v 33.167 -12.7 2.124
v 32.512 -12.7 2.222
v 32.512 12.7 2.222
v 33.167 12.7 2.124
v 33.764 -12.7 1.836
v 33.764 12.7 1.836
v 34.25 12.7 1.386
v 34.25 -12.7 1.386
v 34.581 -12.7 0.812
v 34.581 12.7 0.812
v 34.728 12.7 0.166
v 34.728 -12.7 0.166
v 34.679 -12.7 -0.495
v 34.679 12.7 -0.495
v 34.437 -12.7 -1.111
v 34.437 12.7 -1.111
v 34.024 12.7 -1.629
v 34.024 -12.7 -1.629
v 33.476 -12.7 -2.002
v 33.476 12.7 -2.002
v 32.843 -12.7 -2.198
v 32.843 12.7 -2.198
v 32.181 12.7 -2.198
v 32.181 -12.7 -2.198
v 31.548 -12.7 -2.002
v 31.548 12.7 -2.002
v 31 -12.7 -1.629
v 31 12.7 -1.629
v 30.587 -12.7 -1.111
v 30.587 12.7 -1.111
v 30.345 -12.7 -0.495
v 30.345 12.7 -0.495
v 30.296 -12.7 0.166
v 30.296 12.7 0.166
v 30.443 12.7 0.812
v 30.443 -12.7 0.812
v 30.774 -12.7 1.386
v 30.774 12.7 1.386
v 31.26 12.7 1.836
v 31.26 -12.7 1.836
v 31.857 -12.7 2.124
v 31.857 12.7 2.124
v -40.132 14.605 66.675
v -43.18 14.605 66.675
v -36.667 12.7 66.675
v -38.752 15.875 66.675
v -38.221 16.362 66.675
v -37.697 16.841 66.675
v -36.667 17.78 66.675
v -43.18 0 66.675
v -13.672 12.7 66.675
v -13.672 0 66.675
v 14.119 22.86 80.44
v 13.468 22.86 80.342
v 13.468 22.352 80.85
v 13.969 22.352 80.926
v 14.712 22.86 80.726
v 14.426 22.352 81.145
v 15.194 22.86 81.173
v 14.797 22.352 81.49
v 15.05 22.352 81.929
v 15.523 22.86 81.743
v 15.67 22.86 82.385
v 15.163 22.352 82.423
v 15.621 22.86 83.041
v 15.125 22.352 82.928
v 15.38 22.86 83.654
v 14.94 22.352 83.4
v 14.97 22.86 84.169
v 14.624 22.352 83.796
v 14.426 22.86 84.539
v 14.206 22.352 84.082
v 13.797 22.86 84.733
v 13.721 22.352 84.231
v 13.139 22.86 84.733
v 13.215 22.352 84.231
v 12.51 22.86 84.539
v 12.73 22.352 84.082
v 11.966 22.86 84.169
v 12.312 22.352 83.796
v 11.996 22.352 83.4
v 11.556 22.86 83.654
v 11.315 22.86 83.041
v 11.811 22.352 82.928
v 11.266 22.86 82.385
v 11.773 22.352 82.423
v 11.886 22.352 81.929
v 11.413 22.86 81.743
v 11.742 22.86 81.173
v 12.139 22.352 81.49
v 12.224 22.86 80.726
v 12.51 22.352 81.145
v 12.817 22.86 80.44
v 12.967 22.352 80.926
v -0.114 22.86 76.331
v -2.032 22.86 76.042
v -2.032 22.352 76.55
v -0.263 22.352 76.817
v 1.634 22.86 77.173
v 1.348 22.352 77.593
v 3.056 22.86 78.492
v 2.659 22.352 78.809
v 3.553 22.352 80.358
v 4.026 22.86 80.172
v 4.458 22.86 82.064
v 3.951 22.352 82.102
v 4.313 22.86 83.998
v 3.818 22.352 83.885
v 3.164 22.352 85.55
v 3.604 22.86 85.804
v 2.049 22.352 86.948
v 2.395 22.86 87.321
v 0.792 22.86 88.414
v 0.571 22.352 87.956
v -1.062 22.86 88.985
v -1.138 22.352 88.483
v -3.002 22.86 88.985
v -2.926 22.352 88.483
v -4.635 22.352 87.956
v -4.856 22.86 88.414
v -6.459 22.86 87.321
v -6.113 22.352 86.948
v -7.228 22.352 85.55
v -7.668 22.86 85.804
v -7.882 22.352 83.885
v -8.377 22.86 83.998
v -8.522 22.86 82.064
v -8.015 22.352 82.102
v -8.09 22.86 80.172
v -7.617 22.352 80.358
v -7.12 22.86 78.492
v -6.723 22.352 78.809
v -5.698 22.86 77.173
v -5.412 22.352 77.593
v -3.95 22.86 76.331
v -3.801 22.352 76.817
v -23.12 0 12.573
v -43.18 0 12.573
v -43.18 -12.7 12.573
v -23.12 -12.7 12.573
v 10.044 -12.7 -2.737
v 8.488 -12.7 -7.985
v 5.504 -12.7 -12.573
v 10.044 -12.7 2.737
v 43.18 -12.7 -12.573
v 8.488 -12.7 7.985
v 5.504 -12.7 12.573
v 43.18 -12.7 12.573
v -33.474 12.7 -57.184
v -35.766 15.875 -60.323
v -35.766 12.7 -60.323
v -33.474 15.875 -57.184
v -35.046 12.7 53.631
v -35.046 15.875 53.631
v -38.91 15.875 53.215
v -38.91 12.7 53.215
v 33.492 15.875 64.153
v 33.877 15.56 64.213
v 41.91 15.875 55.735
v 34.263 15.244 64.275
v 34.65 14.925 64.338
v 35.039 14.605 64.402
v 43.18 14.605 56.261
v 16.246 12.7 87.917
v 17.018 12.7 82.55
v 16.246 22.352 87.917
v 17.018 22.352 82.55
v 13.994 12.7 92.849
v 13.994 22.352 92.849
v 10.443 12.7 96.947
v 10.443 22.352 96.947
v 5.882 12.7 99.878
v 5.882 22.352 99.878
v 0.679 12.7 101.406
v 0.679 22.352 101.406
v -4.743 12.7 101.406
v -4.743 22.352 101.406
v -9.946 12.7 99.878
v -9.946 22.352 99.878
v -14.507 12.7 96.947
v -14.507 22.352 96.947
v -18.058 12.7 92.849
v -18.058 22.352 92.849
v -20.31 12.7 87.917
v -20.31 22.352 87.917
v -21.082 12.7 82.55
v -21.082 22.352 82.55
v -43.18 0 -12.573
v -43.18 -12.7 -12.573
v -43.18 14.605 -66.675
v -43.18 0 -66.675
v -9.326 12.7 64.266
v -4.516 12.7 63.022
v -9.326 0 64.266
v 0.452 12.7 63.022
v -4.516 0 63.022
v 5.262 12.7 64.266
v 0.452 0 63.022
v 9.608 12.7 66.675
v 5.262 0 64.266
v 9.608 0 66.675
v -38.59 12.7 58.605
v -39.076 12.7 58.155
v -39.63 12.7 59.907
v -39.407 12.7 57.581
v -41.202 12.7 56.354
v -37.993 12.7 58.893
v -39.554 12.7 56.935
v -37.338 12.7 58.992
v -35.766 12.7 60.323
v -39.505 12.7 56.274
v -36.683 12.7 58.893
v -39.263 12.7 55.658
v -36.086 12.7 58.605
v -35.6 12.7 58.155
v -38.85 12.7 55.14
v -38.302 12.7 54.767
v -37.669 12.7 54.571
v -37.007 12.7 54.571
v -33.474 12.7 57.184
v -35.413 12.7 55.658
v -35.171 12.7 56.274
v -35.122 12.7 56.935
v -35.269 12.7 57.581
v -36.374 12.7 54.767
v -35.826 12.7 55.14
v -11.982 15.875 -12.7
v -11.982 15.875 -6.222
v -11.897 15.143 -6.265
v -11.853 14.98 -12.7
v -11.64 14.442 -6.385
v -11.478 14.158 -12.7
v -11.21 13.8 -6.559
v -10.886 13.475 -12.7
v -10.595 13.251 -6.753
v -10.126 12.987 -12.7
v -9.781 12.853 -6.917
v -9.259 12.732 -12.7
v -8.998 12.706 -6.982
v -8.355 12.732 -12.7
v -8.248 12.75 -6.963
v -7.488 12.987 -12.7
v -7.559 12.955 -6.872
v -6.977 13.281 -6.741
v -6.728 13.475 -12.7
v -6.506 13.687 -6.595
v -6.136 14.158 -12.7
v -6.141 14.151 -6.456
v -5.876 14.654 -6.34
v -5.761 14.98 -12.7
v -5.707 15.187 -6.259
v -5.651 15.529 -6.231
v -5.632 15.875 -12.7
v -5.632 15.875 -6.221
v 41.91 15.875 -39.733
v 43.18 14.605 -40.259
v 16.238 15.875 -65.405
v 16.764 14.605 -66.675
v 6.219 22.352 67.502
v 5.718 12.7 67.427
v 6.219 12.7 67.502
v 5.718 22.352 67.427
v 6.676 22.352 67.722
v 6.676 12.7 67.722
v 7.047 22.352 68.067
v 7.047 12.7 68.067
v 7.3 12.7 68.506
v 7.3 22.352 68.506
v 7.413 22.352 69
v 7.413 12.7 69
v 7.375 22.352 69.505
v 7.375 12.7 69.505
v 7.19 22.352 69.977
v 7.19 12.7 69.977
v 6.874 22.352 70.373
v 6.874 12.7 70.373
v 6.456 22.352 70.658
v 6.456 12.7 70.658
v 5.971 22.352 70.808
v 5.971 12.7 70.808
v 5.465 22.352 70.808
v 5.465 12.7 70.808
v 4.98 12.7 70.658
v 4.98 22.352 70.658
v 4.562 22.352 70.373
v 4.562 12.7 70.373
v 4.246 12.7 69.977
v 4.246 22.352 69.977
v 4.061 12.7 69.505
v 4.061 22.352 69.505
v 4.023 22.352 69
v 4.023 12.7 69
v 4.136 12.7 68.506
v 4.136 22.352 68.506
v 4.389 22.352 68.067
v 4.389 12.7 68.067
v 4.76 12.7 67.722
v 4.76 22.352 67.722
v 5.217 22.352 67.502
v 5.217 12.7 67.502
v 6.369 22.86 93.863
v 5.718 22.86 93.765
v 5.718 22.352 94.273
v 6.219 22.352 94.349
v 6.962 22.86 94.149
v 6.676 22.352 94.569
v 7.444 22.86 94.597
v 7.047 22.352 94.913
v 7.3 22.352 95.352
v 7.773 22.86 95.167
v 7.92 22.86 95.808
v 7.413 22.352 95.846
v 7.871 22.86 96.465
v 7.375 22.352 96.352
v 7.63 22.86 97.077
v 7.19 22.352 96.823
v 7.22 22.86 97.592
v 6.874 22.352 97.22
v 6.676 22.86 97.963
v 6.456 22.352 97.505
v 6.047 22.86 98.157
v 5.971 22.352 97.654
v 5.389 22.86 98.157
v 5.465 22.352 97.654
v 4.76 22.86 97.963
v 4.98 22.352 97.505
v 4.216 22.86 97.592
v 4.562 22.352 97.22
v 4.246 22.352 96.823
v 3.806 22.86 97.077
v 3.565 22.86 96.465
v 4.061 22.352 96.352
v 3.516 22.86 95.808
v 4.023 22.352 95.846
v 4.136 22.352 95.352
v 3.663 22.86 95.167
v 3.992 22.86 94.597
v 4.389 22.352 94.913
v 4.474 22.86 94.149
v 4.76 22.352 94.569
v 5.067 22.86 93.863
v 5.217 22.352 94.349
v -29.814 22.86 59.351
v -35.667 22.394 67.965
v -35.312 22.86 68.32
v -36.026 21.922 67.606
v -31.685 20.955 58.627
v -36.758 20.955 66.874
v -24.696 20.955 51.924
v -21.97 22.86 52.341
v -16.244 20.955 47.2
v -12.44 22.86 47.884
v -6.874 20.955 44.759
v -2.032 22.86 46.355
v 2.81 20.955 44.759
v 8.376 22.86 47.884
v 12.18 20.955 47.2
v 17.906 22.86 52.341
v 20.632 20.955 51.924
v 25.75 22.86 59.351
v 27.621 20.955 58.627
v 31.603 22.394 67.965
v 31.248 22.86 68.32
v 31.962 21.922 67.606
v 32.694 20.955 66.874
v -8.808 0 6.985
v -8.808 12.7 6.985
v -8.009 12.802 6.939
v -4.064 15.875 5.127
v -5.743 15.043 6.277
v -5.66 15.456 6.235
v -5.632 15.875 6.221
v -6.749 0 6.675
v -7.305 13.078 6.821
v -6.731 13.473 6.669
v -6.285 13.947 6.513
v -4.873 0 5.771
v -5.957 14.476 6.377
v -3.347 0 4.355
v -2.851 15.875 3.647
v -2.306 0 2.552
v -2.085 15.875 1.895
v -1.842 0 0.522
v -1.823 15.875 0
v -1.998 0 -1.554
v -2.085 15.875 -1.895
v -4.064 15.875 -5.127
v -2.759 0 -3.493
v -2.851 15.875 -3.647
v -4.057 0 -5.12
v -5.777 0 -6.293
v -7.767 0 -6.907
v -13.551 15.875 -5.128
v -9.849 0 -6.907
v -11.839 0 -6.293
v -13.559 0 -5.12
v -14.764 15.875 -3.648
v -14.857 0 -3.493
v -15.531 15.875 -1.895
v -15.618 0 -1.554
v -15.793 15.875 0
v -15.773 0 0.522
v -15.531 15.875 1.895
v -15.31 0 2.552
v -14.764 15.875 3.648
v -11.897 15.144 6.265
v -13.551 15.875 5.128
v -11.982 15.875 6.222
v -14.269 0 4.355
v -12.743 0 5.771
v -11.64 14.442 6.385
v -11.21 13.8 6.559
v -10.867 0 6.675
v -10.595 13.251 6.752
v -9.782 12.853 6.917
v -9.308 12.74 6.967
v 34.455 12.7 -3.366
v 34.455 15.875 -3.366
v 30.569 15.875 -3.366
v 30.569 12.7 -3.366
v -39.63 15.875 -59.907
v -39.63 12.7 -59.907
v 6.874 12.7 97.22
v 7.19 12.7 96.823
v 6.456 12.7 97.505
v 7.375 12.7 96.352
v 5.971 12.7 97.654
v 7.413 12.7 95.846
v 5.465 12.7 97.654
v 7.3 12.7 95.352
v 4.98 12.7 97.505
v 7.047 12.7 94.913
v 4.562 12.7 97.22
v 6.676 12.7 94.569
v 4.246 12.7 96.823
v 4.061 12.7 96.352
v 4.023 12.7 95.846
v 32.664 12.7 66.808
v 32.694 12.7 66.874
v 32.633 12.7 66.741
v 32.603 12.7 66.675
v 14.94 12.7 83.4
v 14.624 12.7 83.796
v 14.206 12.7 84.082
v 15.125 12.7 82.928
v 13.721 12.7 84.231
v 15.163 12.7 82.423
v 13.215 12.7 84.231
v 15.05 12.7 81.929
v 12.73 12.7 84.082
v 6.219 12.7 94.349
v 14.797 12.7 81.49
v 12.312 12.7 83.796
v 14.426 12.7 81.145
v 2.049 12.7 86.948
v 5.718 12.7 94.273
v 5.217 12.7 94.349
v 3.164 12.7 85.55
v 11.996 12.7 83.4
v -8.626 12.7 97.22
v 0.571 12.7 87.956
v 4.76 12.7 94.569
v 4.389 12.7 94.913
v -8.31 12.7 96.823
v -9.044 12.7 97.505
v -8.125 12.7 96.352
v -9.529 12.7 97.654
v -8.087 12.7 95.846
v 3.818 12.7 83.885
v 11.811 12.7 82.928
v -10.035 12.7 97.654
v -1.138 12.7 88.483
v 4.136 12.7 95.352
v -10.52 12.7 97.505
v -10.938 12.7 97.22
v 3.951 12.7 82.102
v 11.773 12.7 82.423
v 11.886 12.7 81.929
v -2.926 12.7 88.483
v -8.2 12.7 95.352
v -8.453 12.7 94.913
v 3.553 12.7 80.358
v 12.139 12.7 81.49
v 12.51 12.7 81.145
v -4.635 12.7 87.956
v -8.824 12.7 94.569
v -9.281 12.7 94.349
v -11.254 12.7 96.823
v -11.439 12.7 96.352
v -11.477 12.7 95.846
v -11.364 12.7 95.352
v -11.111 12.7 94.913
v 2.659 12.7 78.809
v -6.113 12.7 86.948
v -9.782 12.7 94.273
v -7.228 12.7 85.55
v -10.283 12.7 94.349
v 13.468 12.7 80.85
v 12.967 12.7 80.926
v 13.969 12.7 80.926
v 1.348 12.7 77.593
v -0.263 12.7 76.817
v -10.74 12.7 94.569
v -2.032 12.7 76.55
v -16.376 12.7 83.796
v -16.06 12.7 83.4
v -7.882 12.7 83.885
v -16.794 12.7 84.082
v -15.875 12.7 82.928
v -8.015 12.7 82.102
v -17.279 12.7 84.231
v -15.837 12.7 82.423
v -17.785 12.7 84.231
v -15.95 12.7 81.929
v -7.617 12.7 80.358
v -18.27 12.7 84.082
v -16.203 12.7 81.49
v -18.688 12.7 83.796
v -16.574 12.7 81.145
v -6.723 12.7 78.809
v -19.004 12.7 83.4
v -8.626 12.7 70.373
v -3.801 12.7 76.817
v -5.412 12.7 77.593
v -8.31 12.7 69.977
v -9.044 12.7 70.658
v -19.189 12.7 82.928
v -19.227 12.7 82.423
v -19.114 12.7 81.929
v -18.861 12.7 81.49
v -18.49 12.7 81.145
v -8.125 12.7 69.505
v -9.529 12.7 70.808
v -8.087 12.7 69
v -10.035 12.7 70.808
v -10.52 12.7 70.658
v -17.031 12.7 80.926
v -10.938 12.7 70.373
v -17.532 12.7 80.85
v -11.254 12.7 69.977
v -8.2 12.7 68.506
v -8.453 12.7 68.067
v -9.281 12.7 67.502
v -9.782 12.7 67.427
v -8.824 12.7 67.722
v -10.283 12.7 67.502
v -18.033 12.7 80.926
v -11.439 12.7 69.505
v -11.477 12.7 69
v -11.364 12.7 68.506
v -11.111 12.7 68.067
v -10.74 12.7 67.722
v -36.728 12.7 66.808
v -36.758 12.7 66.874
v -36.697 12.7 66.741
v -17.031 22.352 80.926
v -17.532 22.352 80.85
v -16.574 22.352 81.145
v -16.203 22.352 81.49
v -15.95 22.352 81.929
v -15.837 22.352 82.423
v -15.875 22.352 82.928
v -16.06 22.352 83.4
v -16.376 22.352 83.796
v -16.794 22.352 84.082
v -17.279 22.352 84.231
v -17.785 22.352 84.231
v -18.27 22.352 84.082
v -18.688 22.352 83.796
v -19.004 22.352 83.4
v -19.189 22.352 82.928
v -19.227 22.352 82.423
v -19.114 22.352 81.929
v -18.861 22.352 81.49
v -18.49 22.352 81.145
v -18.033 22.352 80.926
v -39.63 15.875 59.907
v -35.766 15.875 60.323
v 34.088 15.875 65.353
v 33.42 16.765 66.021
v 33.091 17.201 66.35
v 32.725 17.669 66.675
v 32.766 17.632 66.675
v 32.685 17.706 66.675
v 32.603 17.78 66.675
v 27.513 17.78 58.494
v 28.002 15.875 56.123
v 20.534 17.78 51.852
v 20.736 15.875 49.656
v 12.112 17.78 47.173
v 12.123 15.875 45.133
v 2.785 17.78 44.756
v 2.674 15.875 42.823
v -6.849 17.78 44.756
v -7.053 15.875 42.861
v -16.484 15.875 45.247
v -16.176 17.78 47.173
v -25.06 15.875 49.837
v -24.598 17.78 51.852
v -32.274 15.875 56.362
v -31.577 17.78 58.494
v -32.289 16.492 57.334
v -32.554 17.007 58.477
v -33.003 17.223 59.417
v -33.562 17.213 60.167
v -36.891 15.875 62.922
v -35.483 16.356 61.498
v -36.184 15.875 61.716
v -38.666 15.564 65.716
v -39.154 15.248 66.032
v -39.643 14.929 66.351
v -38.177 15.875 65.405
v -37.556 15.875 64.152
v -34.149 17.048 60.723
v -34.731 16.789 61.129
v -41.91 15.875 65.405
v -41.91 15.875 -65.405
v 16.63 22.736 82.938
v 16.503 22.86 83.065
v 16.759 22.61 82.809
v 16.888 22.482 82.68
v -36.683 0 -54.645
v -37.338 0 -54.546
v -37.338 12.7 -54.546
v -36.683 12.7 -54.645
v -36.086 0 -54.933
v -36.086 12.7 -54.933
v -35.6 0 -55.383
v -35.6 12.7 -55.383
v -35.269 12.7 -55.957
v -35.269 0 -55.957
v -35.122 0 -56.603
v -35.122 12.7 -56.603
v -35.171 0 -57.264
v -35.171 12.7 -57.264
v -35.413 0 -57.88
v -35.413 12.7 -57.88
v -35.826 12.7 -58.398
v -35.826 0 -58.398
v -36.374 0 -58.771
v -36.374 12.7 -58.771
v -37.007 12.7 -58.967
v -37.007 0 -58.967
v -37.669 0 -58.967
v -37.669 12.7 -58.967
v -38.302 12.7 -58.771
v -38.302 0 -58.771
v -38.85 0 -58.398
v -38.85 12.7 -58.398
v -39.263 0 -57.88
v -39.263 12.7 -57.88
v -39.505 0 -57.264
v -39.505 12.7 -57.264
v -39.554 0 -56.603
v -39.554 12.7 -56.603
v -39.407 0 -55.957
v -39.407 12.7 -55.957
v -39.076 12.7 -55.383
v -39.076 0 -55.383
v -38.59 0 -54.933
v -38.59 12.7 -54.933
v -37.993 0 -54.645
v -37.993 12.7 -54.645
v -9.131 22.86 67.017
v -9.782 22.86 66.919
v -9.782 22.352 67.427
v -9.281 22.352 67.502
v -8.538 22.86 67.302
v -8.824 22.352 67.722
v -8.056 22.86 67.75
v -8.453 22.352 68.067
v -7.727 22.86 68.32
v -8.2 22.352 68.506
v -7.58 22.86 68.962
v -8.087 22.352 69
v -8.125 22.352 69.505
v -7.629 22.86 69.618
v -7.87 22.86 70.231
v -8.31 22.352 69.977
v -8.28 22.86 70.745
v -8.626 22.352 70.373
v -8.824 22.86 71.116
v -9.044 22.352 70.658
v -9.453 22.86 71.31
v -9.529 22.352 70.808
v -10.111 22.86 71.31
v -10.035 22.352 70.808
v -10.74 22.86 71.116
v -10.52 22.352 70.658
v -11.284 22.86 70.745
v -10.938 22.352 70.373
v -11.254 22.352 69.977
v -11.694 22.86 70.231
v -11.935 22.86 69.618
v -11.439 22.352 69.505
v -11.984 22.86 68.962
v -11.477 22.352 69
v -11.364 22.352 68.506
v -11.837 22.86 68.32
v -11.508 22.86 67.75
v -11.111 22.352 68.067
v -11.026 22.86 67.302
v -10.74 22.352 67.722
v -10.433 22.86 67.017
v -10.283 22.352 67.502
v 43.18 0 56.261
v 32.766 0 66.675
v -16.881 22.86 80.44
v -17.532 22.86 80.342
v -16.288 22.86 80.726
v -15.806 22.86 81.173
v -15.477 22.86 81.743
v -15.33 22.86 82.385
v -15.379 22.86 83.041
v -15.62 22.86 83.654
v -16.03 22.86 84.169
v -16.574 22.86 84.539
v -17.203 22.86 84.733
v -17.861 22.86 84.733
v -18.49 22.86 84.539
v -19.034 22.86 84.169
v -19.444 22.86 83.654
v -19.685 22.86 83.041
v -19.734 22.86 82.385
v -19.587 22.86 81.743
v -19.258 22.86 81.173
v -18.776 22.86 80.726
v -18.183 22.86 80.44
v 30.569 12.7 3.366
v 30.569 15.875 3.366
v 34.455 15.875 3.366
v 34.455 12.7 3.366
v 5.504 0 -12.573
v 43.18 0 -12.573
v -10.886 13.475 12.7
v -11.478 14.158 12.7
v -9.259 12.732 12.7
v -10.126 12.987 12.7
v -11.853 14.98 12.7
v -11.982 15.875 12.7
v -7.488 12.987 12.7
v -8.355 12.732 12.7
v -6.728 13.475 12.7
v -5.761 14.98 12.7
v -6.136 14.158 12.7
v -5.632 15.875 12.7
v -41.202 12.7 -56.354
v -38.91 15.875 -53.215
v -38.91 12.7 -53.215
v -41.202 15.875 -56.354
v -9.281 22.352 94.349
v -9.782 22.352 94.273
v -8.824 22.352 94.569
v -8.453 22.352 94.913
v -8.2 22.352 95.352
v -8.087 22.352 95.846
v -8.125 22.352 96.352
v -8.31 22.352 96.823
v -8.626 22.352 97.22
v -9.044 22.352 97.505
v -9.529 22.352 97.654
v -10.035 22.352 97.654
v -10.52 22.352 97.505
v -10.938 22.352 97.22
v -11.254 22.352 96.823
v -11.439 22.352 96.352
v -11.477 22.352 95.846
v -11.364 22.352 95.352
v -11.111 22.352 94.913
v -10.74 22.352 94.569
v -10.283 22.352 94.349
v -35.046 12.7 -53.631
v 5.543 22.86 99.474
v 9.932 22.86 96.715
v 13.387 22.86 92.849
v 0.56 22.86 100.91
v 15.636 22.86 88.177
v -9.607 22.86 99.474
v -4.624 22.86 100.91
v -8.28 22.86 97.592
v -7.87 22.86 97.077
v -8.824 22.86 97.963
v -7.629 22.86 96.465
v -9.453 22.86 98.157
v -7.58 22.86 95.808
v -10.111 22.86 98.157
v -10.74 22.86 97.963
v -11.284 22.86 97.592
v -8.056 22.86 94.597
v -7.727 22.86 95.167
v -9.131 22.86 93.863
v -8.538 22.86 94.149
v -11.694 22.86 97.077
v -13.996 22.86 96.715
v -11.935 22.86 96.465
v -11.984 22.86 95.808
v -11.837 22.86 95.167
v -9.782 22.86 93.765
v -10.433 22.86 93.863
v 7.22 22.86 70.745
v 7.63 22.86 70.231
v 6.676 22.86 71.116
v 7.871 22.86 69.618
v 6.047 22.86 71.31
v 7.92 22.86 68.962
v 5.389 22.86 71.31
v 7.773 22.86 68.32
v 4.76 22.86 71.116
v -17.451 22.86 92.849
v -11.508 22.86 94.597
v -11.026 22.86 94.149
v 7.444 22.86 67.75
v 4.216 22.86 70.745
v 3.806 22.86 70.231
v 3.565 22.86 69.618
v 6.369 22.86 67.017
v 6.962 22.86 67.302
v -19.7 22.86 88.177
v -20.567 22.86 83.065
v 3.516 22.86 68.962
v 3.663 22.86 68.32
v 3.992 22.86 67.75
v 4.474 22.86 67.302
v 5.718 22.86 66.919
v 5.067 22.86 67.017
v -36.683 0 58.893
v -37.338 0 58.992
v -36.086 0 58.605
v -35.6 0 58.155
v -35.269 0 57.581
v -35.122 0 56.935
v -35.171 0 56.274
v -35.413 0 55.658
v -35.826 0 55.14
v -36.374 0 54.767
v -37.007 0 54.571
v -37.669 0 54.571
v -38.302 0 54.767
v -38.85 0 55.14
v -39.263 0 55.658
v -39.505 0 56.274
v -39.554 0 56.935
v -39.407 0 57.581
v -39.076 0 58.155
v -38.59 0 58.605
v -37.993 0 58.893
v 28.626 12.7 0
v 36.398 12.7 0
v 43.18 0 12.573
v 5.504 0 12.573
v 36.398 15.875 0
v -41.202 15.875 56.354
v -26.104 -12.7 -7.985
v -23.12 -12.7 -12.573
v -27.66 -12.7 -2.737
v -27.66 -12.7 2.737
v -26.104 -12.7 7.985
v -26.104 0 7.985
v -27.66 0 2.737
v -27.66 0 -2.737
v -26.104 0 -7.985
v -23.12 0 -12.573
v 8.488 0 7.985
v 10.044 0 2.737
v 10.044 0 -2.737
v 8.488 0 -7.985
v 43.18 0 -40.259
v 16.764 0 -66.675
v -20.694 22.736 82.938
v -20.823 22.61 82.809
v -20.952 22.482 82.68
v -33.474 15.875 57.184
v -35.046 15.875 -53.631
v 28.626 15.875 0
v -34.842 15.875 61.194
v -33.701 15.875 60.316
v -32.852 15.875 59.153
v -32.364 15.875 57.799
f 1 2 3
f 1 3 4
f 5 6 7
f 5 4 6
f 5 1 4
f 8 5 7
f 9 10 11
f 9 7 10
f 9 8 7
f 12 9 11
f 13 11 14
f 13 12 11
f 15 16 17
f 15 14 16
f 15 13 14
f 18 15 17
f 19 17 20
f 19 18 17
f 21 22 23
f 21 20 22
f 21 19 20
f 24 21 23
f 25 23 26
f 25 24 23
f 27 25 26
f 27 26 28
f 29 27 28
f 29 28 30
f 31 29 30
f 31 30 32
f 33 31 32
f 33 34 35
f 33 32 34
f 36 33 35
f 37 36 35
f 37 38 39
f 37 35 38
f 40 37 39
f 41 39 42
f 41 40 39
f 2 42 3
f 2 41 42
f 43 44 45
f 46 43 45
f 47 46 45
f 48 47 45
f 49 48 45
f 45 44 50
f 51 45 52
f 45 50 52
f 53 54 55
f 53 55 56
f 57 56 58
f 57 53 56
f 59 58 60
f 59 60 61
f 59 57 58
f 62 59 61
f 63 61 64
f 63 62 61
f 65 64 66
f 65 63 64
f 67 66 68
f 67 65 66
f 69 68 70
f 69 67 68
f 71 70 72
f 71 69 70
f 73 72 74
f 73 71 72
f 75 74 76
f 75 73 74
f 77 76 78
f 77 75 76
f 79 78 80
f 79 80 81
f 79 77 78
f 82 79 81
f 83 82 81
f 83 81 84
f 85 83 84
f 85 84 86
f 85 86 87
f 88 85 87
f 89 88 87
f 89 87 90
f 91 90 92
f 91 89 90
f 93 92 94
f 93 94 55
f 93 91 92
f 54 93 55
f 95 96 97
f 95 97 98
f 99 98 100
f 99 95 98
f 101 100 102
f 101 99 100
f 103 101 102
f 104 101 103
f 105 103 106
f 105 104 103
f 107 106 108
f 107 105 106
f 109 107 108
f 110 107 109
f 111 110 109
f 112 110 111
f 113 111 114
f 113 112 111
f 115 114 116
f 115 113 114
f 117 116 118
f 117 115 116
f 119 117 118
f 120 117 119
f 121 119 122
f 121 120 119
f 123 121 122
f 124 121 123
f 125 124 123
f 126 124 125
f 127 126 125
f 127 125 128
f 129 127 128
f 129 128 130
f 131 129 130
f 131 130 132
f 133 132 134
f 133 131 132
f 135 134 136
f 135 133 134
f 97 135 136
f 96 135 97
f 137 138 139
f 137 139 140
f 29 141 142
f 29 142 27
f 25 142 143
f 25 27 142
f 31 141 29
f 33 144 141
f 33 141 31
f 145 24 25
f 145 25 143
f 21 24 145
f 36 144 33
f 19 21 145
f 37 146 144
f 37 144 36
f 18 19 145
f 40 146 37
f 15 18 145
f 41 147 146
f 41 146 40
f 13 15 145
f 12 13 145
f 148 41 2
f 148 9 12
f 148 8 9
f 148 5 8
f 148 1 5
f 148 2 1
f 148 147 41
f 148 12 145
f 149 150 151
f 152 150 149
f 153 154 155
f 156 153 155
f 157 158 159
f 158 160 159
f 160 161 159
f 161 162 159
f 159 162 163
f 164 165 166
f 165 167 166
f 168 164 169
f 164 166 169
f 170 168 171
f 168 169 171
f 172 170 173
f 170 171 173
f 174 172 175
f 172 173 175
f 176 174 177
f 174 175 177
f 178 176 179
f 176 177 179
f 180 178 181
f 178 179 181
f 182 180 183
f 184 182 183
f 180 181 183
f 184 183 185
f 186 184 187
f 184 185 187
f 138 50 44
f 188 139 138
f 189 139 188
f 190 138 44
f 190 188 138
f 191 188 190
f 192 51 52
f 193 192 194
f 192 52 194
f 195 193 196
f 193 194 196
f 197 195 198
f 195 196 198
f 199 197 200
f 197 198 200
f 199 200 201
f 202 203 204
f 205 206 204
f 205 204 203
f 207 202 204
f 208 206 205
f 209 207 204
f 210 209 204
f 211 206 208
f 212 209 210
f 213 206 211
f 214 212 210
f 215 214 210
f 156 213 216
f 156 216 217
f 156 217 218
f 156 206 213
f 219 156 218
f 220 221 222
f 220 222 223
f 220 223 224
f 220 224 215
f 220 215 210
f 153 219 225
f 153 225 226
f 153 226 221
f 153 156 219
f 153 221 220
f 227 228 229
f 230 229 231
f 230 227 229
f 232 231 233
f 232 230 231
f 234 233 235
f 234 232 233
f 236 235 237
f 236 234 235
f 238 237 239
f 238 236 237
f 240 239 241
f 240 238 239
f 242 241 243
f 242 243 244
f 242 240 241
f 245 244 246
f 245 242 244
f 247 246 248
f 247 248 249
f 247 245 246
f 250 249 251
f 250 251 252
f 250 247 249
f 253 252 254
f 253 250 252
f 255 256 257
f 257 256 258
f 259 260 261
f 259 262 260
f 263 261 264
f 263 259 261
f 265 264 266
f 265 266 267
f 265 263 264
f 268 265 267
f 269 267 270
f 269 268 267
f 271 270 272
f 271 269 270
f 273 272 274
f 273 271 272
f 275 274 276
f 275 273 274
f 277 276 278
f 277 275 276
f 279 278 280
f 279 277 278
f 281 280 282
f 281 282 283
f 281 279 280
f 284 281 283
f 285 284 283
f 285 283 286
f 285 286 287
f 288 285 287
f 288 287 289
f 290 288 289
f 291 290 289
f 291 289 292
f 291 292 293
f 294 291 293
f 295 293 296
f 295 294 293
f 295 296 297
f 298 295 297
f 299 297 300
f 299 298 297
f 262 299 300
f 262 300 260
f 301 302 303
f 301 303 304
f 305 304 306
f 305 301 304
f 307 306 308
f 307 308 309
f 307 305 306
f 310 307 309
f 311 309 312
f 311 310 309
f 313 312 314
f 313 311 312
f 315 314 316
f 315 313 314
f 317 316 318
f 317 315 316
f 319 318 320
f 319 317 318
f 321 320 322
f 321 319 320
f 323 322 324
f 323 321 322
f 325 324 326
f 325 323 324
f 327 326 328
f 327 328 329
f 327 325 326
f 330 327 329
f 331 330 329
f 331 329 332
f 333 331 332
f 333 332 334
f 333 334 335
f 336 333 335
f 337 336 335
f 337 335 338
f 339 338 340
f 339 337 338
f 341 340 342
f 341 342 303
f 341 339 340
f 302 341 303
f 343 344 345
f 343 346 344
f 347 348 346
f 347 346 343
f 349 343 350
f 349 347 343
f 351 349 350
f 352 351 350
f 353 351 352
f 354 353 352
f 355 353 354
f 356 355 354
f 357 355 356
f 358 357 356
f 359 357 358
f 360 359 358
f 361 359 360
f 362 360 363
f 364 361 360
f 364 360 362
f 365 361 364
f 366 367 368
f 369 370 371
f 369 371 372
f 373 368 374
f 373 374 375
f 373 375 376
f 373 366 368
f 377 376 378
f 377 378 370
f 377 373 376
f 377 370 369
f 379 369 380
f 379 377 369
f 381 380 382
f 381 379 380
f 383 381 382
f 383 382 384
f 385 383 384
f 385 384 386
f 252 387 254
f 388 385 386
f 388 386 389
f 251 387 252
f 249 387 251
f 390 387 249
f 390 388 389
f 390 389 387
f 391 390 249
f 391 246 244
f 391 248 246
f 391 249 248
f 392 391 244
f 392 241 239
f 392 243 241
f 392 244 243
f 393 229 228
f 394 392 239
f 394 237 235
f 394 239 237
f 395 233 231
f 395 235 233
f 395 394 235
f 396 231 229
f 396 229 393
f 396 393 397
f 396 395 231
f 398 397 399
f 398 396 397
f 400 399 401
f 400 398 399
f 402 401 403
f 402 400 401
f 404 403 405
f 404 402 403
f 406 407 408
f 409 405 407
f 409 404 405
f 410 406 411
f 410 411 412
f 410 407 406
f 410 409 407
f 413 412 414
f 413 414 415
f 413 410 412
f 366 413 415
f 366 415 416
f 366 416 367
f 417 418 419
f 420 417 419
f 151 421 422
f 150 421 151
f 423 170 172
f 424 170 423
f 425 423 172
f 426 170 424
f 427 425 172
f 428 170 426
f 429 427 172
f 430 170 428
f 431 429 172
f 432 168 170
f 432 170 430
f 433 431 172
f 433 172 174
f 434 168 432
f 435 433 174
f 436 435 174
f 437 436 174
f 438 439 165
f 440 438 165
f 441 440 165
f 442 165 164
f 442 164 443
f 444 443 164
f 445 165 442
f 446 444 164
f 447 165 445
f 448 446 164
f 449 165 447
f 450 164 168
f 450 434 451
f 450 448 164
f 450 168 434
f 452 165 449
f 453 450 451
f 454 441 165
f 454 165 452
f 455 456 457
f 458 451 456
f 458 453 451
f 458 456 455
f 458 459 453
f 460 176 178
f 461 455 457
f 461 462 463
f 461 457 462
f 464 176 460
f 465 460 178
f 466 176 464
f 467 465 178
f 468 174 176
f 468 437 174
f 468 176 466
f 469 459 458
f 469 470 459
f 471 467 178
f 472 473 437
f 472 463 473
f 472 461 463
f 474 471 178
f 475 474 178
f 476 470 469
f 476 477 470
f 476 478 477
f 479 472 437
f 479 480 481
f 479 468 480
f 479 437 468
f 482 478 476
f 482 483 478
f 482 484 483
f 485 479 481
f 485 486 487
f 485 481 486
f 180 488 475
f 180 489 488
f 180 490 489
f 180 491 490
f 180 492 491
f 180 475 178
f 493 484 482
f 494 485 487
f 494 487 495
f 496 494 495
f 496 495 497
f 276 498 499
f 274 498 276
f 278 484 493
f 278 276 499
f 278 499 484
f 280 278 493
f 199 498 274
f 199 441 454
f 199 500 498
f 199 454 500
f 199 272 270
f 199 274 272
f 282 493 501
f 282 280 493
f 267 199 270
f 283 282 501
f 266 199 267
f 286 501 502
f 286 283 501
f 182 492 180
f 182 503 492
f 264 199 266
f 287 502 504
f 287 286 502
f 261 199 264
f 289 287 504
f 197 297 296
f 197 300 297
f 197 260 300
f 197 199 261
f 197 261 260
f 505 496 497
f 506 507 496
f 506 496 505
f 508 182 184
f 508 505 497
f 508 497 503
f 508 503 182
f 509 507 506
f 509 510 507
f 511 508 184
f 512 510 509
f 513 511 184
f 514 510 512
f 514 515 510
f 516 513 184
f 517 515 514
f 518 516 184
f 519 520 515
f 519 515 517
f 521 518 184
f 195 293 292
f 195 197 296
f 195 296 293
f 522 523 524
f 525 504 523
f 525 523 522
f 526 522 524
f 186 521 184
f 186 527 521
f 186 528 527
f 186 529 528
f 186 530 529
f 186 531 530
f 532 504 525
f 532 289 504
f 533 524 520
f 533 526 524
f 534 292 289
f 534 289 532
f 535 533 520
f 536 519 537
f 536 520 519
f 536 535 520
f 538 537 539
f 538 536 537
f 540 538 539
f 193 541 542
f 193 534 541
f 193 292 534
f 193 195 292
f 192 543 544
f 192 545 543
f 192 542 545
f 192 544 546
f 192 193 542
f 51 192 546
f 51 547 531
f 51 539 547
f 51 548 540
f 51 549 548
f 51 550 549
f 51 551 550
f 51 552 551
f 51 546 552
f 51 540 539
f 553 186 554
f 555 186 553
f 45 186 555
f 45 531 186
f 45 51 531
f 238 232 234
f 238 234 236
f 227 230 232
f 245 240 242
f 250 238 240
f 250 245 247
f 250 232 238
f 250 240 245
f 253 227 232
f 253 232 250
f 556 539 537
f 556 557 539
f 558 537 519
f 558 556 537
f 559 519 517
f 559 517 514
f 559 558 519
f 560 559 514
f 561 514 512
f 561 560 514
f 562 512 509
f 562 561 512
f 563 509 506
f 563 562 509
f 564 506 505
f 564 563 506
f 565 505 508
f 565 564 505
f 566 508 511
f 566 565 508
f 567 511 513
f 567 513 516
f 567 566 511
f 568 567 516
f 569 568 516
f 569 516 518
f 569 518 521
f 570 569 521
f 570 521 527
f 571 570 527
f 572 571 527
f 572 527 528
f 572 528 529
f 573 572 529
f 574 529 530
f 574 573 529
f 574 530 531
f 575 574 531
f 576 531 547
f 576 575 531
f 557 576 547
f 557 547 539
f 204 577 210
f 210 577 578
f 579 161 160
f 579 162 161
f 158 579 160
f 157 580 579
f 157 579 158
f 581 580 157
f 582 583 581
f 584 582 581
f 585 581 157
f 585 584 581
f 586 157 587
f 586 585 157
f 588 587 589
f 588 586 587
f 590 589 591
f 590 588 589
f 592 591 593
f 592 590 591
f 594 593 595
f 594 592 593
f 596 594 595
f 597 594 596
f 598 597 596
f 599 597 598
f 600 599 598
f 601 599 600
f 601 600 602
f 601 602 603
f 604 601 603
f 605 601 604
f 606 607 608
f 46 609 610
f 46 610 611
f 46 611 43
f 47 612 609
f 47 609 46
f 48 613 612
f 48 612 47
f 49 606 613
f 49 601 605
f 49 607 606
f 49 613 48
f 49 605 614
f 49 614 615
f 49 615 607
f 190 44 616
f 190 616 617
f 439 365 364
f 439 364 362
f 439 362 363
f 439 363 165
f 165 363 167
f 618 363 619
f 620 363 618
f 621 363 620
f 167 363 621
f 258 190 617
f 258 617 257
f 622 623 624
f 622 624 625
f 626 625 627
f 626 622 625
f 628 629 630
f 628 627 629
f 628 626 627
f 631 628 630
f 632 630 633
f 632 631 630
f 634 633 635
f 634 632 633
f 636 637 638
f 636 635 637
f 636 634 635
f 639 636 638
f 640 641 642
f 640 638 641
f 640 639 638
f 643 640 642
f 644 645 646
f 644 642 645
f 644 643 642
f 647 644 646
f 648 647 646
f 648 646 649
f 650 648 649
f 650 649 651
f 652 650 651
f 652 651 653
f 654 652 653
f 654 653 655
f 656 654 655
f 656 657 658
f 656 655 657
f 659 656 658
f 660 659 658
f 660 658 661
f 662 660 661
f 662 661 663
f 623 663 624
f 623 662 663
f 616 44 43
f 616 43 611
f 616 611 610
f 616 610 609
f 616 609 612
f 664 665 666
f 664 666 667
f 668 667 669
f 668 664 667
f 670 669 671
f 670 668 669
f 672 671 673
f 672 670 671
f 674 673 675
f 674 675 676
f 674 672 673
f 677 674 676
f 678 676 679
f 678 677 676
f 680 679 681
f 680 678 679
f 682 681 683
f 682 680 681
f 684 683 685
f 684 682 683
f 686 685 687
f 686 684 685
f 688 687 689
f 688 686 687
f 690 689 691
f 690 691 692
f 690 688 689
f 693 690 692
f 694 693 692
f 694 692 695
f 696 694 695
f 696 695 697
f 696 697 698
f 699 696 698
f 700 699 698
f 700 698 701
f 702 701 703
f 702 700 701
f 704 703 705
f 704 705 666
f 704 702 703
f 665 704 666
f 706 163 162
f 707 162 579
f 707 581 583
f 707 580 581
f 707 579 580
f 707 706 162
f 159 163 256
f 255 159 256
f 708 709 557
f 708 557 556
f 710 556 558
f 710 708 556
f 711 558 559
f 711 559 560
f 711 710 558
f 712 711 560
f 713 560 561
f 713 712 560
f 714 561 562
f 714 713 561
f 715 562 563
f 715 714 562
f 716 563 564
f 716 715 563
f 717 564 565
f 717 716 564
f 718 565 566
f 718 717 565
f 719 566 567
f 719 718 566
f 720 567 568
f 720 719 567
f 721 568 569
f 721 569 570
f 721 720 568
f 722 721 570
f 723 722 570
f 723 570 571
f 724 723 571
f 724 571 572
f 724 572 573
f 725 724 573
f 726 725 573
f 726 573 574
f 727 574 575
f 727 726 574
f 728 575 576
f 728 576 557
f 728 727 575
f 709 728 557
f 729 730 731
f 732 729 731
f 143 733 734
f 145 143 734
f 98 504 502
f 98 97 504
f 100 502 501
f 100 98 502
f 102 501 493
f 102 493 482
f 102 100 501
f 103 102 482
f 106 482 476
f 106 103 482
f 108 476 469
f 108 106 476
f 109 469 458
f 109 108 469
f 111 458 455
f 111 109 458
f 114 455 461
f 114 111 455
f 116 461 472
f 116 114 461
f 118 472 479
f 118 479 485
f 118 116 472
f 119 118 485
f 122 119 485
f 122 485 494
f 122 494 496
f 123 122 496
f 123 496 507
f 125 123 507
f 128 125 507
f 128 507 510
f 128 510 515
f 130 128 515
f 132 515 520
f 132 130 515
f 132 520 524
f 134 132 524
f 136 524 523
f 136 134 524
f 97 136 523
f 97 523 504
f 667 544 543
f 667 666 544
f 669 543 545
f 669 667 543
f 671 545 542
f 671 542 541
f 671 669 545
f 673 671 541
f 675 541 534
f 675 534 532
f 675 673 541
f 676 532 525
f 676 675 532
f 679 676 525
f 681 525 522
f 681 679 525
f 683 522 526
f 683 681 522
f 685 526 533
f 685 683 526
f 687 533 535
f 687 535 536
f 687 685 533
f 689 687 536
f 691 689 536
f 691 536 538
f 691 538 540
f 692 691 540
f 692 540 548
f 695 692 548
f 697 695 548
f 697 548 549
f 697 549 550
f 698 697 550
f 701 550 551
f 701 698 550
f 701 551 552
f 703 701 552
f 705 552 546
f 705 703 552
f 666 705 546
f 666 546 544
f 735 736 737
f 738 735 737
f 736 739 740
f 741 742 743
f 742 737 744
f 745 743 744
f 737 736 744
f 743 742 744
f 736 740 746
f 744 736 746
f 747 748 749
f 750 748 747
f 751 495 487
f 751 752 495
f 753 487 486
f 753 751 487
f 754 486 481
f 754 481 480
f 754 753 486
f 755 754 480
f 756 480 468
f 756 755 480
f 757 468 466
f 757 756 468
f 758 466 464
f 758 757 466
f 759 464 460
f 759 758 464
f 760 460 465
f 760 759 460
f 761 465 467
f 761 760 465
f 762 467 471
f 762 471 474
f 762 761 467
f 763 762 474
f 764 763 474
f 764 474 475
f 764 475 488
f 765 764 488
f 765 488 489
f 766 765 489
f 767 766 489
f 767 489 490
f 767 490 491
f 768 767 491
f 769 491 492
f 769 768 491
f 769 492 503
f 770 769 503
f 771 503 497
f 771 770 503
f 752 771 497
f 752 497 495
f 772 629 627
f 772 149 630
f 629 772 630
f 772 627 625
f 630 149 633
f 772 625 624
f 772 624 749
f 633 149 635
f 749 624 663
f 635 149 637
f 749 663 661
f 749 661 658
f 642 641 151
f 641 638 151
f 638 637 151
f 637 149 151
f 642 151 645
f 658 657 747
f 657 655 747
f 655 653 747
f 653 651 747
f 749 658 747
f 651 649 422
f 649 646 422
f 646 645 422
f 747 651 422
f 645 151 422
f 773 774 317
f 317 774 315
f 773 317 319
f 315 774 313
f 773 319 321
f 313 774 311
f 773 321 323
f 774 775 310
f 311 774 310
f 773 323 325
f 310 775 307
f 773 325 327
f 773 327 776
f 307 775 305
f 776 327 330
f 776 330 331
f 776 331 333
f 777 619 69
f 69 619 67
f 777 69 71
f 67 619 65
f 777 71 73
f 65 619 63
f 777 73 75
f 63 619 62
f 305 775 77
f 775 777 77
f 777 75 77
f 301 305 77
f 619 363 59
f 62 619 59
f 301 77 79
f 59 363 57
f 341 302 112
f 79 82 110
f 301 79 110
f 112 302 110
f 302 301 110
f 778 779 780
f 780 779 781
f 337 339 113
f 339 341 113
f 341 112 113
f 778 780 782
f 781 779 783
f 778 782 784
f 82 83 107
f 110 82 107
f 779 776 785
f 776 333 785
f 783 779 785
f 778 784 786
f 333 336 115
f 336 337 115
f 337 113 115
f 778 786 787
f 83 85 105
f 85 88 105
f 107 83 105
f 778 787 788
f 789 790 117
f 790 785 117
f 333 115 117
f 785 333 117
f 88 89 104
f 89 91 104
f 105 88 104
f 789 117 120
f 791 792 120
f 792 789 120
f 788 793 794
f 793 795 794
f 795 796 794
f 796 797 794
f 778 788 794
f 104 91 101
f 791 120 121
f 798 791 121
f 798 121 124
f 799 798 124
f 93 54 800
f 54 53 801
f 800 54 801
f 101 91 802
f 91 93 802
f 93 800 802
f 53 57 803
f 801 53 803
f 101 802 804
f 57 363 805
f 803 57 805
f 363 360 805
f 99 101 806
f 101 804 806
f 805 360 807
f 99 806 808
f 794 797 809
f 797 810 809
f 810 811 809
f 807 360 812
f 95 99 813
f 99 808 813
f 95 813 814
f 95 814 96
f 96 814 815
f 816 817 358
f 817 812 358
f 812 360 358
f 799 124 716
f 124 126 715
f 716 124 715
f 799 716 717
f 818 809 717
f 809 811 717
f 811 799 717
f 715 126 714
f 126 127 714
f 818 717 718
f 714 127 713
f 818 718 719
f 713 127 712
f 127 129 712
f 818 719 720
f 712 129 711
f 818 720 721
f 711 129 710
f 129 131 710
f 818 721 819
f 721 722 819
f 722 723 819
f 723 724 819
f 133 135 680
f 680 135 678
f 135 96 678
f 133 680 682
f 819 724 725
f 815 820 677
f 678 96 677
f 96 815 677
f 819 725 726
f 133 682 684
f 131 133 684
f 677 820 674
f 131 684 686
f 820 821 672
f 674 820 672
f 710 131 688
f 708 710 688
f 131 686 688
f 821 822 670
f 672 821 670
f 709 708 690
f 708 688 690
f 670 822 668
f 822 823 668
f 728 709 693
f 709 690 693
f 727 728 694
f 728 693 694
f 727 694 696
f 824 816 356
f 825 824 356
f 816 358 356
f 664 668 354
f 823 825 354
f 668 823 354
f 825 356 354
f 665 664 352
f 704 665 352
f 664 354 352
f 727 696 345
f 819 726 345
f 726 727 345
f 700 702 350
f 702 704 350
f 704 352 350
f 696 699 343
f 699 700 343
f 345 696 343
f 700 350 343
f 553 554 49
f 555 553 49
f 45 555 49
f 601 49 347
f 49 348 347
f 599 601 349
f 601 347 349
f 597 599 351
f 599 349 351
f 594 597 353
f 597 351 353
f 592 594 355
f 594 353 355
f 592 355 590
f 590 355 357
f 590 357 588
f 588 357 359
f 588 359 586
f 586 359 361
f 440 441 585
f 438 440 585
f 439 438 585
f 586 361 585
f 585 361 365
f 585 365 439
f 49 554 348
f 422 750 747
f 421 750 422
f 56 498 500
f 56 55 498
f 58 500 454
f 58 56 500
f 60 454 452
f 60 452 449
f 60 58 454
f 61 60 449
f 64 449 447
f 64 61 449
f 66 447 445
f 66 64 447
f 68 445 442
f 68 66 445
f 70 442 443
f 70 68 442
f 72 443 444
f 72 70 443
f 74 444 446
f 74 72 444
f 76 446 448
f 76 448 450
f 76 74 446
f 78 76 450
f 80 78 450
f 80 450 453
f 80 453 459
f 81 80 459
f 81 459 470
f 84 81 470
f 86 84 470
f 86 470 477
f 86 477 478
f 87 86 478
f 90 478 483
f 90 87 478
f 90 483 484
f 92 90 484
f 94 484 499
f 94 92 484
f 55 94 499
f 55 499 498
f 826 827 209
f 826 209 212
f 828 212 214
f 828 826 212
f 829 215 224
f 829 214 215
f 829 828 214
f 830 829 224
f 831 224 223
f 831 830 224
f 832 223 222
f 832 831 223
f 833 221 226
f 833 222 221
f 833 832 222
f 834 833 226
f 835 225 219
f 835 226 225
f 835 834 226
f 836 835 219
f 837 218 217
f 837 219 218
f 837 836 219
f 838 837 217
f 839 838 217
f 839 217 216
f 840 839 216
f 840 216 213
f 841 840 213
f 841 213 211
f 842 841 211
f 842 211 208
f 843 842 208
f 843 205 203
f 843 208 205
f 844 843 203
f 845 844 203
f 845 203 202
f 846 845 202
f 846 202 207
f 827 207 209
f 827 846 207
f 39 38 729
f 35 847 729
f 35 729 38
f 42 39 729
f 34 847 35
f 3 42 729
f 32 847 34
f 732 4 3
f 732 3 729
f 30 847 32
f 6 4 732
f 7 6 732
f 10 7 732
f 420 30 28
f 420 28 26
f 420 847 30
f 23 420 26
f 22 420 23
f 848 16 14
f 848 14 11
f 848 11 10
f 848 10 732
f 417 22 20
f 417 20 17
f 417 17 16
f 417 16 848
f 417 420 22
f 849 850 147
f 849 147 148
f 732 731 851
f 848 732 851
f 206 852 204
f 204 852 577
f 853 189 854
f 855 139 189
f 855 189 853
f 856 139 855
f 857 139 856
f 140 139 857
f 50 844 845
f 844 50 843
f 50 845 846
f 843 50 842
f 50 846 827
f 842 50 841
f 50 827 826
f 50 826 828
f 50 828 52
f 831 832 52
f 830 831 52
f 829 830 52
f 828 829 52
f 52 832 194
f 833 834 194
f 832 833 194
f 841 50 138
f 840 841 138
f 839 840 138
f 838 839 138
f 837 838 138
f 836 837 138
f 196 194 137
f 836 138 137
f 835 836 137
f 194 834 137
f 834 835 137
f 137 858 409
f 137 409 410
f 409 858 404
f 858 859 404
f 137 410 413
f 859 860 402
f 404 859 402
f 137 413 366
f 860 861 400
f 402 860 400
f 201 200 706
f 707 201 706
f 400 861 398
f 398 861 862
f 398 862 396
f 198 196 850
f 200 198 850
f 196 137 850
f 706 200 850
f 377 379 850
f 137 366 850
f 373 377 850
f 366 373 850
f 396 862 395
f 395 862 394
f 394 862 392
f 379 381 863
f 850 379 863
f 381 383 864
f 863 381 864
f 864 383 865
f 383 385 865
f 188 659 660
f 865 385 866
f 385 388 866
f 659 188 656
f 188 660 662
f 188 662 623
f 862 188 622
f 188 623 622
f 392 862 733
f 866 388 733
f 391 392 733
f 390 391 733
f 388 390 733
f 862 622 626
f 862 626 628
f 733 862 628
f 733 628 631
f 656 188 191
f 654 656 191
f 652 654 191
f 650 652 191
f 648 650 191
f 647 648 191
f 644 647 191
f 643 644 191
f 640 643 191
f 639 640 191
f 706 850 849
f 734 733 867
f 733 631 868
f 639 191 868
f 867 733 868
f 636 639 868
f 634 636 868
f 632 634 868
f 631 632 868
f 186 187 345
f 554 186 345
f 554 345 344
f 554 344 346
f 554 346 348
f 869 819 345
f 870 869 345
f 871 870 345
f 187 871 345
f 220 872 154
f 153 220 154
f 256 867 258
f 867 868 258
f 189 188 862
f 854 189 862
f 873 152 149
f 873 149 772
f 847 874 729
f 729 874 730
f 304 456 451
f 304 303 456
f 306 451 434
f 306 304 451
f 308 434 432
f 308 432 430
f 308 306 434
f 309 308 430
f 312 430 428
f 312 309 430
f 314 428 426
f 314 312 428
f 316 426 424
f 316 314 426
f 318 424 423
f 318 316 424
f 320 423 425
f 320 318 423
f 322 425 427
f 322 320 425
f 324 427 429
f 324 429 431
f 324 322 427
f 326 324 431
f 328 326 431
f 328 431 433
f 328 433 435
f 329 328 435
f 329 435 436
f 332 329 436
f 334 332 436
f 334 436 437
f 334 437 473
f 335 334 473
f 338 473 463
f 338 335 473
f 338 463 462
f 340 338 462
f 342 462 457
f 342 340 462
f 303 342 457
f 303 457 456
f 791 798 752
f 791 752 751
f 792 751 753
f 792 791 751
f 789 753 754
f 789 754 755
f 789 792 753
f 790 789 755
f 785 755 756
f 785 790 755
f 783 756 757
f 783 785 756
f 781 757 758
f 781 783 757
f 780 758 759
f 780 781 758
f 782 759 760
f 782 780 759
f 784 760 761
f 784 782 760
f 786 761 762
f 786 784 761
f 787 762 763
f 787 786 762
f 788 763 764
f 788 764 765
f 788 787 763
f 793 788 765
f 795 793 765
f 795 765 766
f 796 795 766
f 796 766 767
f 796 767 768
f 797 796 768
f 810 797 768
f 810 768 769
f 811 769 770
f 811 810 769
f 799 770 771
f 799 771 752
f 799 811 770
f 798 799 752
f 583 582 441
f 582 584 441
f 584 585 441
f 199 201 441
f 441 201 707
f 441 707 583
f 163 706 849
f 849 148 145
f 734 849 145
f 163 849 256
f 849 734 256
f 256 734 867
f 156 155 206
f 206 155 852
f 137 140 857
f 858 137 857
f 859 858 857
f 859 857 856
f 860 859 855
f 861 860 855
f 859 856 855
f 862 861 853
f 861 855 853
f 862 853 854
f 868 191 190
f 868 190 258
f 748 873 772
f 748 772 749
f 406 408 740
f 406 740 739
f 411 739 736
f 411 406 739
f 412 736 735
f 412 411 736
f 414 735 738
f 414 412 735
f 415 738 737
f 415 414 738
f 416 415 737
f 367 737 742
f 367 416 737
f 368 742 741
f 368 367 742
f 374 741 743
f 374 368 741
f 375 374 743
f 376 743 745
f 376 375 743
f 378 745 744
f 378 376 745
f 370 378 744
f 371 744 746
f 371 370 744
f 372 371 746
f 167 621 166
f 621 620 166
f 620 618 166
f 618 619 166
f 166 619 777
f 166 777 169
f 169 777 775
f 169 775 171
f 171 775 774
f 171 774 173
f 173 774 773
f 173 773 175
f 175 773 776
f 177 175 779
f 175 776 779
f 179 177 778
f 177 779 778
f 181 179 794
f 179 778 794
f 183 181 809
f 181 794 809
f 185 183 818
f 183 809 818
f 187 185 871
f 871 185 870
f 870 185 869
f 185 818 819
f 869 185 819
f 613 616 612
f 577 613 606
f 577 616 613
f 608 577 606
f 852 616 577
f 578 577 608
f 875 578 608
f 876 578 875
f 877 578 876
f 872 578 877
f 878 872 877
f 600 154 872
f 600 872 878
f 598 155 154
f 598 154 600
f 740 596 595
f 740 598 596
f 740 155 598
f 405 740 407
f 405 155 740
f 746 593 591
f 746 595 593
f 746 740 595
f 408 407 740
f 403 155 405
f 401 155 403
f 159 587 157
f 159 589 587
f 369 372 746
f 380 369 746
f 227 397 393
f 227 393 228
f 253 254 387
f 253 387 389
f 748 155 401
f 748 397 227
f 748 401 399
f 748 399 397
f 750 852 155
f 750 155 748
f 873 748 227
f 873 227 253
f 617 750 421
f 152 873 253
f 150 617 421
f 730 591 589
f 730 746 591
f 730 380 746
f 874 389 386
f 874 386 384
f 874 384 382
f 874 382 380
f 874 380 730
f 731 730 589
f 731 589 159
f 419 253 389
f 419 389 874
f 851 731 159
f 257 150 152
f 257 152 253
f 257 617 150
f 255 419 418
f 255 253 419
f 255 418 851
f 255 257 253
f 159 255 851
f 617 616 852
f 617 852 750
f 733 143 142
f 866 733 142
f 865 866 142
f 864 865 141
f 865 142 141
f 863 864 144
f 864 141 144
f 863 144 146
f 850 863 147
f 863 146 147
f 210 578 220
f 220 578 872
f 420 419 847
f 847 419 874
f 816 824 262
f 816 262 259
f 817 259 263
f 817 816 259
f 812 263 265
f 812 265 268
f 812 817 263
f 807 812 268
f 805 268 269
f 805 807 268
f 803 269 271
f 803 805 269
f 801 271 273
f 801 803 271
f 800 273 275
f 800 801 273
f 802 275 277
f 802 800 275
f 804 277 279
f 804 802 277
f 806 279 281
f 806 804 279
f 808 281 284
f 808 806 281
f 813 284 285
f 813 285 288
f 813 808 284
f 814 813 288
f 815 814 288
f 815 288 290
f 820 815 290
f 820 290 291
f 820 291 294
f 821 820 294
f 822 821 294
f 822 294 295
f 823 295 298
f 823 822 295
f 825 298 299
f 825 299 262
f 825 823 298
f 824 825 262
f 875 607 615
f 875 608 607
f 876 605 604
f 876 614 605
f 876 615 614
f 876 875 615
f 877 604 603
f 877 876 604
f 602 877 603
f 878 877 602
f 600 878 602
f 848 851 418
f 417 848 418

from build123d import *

# Parameters (mm, degrees)
SKETCH1_W               = 86.36
SKETCH1_H               = 133.35
BOSS_EXTRUDE1_DEPTH     = 15.875
SKETCH2_W               = 86.36
SKETCH2_H               = 25.146
BOSS_EXTRUDE2_DEPTH     = 12.7
SKETCH5_R               = 1.7
SKETCH5_R_2             = 6
BOSS_EXTRUDE3_DEPTH     = 3.81
SKETCH6_R               = 19.685
CUT_EXTRUDE1_DEPTH      = 19.05
CHAMFER2_SIZE           = 0.508
SKETCH5_4_R             = 1.7
SKETCH5_4_R_2           = 6
BOSS_EXTRUDE4_DEPTH     = 6.35
CHAMFER1_SIZE           = 1.905
SKETCH7_R               = 5.08
CUT_EXTRUDE2_DEPTH      = 6.35
CUT_EXTRUDE3_DEPTH      = 3.175
CUT_EXTRUDE4_DEPTH      = 115.033341725
CUT_EXTRUDE4_DEPTH_BACK = 115.033341725
SKETCH8_3_R             = 2.2225
CUT_EXTRUDE5_DEPTH      = 115.033341725
CUT_EXTRUDE5_DEPTH_BACK = 115.033341725
SKETCH10_R              = 6.985
CUT_EXTRUDE6_DEPTH      = 12.7
CUT_EXTRUDE6_DEPTH_BACK = 12.7
SKETCH11_R              = 3.175
CHAMFER3_SIZE           = 26.416
CHAMFER4_SIZE           = 10.414
SKETCH13_R              = 19.05
CUT_EXTRUDE7_DEPTH      = 12.7
CHAMFER5_SIZE           = 1.27


with BuildPart() as part:
    # Sketch1 → Boss-Extrude1 (new body)
    with BuildSketch(Plane(origin=(0, 0, 0), x_dir=(1, 0, 0), z_dir=(0, 1, 0))):
        Rectangle(SKETCH1_W, SKETCH1_H)
    extrude(amount=BOSS_EXTRUDE1_DEPTH)

    # Sketch2 → Boss-Extrude2 (add)
    with BuildSketch(Plane.XZ):
        Rectangle(SKETCH2_W, SKETCH2_H)
    extrude(amount=BOSS_EXTRUDE2_DEPTH)

    # Sketch6 → Cut-Extrude1 (cut)
    with BuildSketch(Plane.XZ):
        with Locations((-2.032, 82.55)):
            Circle(SKETCH6_R)
    extrude(amount=-CUT_EXTRUDE1_DEPTH, mode=Mode.SUBTRACT)



with BuildPart() as body_2:
    # Sketch5 → Boss-Extrude3 (new body)
    with BuildSketch(Plane(origin=(0, 19.05, 0), x_dir=(-1, 0, 0), z_dir=(0, -1, 0))):
        with BuildLine():
            Line((-32.693781238, -66.874218762), (-17.018, -82.55))
            ThreePointArc((-17.018, -82.55), (2.032, -101.6), (21.082, -82.55))
            Line((21.082, -82.55), (36.757781238, -66.874218762))
            ThreePointArc((36.757781238, -66.874218762), (2.032, -44.45), (-32.693781238, -66.874218762))
        make_face()
        with Locations(Location((9.782, -69.126606241, 0), (0, 0, 90))):
            Circle(SKETCH5_R, mode=Mode.SUBTRACT)
        with Locations(Location((-5.718, -69.126606241, 0), (0, 0, 90))):
            Circle(SKETCH5_R, mode=Mode.SUBTRACT)
        with Locations(Location((-13.468, -82.55, 0), (0, 0, 90))):
            Circle(SKETCH5_R, mode=Mode.SUBTRACT)
        with Locations(Location((-5.718, -95.973393759, 0), (0, 0, 90))):
            Circle(SKETCH5_R, mode=Mode.SUBTRACT)
        with Locations(Location((9.782, -95.973393759, 0), (0, 0, 90))):
            Circle(SKETCH5_R, mode=Mode.SUBTRACT)
        with Locations(Location((17.532, -82.55, 0), (0, 0, 90))):
            Circle(SKETCH5_R, mode=Mode.SUBTRACT)
        with Locations(Location((2.032, -82.55, 0), (0, 0, 90))):
            Circle(SKETCH5_R_2, mode=Mode.SUBTRACT)
    extrude(amount=-BOSS_EXTRUDE3_DEPTH)

    # Chamfer2
    chamfer2_edges = [body_2.edges().sort_by_distance(p)[0] for p in [
        (-9.782, 22.86, 70.826606241),
        (-17.532, 22.86, 84.25),
        (-9.782, 22.86, 97.673393759),
        (5.718, 22.86, 97.673393759),
        (13.468, 22.86, 84.25),
        (5.718, 22.86, 70.826606241),
        (-2.032, 22.86, 101.6),
        (-2.032, 22.86, 88.55),
    ]]
    chamfer(chamfer2_edges, length=CHAMFER2_SIZE)


with BuildPart() as part_1:
    add(part.part)

    add(body_2.part)  # Boss-Extrude4 merges body 2
    # Sketch5<4> → Boss-Extrude4 (add)
    with BuildSketch(Plane(origin=(0, 19.05, 0), x_dir=(-1, 0, 0), z_dir=(0, -1, 0))):
        with BuildLine():
            Line((-32.693781238, -66.874218762), (-17.018, -82.55))
            ThreePointArc((-17.018, -82.55), (2.032, -101.6), (21.082, -82.55))
            Line((21.082, -82.55), (36.757781238, -66.874218762))
            ThreePointArc((36.757781238, -66.874218762), (2.032, -44.45), (-32.693781238, -66.874218762))
        make_face()
        with Locations(Location((9.782, -69.126606241, 0), (0, 0, 90))):
            Circle(SKETCH5_4_R, mode=Mode.SUBTRACT)
        with Locations(Location((-5.718, -69.126606241, 0), (0, 0, 90))):
            Circle(SKETCH5_4_R, mode=Mode.SUBTRACT)
        with Locations(Location((-13.468, -82.55, 0), (0, 0, 90))):
            Circle(SKETCH5_4_R, mode=Mode.SUBTRACT)
        with Locations(Location((-5.718, -95.973393759, 0), (0, 0, 90))):
            Circle(SKETCH5_4_R, mode=Mode.SUBTRACT)
        with Locations(Location((9.782, -95.973393759, 0), (0, 0, 90))):
            Circle(SKETCH5_4_R, mode=Mode.SUBTRACT)
        with Locations(Location((17.532, -82.55, 0), (0, 0, 90))):
            Circle(SKETCH5_4_R, mode=Mode.SUBTRACT)
        with Locations(Location((2.032, -82.55, 0), (0, 0, 90))):
            Circle(SKETCH5_4_R_2, mode=Mode.SUBTRACT)
    extrude(amount=BOSS_EXTRUDE4_DEPTH)

    # Chamfer1
    chamfer1_edges = [part_1.edges().sort_by_distance(p)[0] for p in [
        (-2.032, 15.875, 44.45),
        (-2.032, 22.86, 44.45),
    ]]
    chamfer(chamfer1_edges, length=CHAMFER1_SIZE)

    # Sketch7 → Cut-Extrude2 (cut)
    with BuildSketch(Plane(origin=(0, 15.875, 0), x_dir=(1, 0, 0), z_dir=(0, 1, 0))):
        with Locations((-37.338, -56.769)):
            Circle(SKETCH7_R)
    extrude(amount=CUT_EXTRUDE2_DEPTH, mode=Mode.SUBTRACT)

    # Sketch8 → Cut-Extrude3 (cut)
    with BuildSketch(Plane(origin=(0, 15.875, 0), x_dir=(1, 0, 0), z_dir=(0, 1, 0))):
        Polygon((-35.046242541, -53.63053412), (-38.910112452, -53.215046881), (-41.201869911, -56.353512761), (-39.629757459, -59.90746588), (-35.765887548, -60.322953119), (-33.474130089, -57.184487239), align=None)
        Polygon((-35.765887548, 60.322953119), (-33.474130089, 57.184487239), (-35.046242541, 53.63053412), (-38.910112452, 53.215046881), (-41.201869911, 56.353512761), (-39.629757459, 59.90746588), align=None)
        Polygon((28.625855338, 0), (30.568927669, -3.3655), (34.455072331, -3.3655), (36.398144662, 0), (34.455072331, 3.3655), (30.568927669, 3.3655), align=None)
    extrude(amount=-CUT_EXTRUDE3_DEPTH, mode=Mode.SUBTRACT)

    # Sketch8<3> → Cut-Extrude4 (cut, two sides: drawn at the far end of the back side and taken through both)
    with BuildSketch(Plane(origin=(0, 15.875, 0), x_dir=(1, 0, 0), z_dir=(0, 1, 0)).offset(-CUT_EXTRUDE4_DEPTH_BACK)):
        with Locations(Location((-37.338, -56.769, 0), (0, 0, 270))):
            Circle(SKETCH8_3_R)
        with Locations(Location((-37.338, 56.769, 0), (0, 0, 270))):
            Circle(SKETCH8_3_R)
        with Locations(Location((32.512, 0, 0), (0, 0, 270))):
            Circle(SKETCH8_3_R)
    extrude(amount=CUT_EXTRUDE4_DEPTH + CUT_EXTRUDE4_DEPTH_BACK, mode=Mode.SUBTRACT)

    # Sketch10 → Cut-Extrude5 (cut, two sides: drawn at the far end of the back side and taken through both)
    with BuildSketch(Plane(origin=(0, 15.875, 0), x_dir=(1, 0, 0), z_dir=(0, 1, 0)).offset(-CUT_EXTRUDE5_DEPTH_BACK)):
        with Locations(Location((-8.807904265, 0, 0), (0, 0, 270))):
            Circle(SKETCH10_R)
    extrude(amount=CUT_EXTRUDE5_DEPTH + CUT_EXTRUDE5_DEPTH_BACK, mode=Mode.SUBTRACT)

    # Sketch11 → Cut-Extrude6 (cut, two sides: drawn at the far end of the back side and taken through both)
    with BuildSketch(Plane.XY.offset(-CUT_EXTRUDE6_DEPTH_BACK)):
        with Locations((-8.807000374, 15.875)):
            Circle(SKETCH11_R)
    extrude(amount=CUT_EXTRUDE6_DEPTH + CUT_EXTRUDE6_DEPTH_BACK, mode=Mode.SUBTRACT)

    # Chamfer3
    chamfer3_edges = [part_1.edges().sort_by_distance(p)[0] for p in [
        (43.18, 7.9375, -66.675),
    ]]
    chamfer(chamfer3_edges, length=CHAMFER3_SIZE)

    # Chamfer4
    # the kernel refuses this chamfer: 10.414 mm, written as the material it takes off along each edge
    with BuildSketch(Plane(origin=(43.18, -26.781506637, 66.675), x_dir=(0.02749587661058629, 0, -0.9996219169112966), z_dir=(0, 1, 0))) as chamfer4_piece_1:
        Polygon((CHAMFER4_SIZE * 0.999621916911, CHAMFER4_SIZE * 0.0274958766106), (-CHAMFER4_SIZE * 0.0274958766106, CHAMFER4_SIZE * 0.999621916911), (0, 0), align=None)
    extrude(amount=69.438013273, mode=Mode.SUBTRACT)

    # Sketch13 → Cut-Extrude7 (cut)
    with BuildSketch(Plane.XZ.offset(12.7)):
        with Locations((-8.807904265, 0)):
            Circle(SKETCH13_R)
    extrude(amount=-CUT_EXTRUDE7_DEPTH, mode=Mode.SUBTRACT)

    # Chamfer5
    chamfer5_edges = [part_1.edges().sort_by_distance(p)[0] for p in [
        (-40.966177014, 15.875, 66.675),
        (-43.18, 15.875, 0),
        (-13.208, 15.875, -66.675),
        (29.972, 15.875, -53.467),
        (43.18, 15.875, 8.001),
        (38.634041338, 15.875, 60.806958662),
    ]]
    chamfer(chamfer5_edges, length=CHAMFER5_SIZE)


solid = part_1.part
